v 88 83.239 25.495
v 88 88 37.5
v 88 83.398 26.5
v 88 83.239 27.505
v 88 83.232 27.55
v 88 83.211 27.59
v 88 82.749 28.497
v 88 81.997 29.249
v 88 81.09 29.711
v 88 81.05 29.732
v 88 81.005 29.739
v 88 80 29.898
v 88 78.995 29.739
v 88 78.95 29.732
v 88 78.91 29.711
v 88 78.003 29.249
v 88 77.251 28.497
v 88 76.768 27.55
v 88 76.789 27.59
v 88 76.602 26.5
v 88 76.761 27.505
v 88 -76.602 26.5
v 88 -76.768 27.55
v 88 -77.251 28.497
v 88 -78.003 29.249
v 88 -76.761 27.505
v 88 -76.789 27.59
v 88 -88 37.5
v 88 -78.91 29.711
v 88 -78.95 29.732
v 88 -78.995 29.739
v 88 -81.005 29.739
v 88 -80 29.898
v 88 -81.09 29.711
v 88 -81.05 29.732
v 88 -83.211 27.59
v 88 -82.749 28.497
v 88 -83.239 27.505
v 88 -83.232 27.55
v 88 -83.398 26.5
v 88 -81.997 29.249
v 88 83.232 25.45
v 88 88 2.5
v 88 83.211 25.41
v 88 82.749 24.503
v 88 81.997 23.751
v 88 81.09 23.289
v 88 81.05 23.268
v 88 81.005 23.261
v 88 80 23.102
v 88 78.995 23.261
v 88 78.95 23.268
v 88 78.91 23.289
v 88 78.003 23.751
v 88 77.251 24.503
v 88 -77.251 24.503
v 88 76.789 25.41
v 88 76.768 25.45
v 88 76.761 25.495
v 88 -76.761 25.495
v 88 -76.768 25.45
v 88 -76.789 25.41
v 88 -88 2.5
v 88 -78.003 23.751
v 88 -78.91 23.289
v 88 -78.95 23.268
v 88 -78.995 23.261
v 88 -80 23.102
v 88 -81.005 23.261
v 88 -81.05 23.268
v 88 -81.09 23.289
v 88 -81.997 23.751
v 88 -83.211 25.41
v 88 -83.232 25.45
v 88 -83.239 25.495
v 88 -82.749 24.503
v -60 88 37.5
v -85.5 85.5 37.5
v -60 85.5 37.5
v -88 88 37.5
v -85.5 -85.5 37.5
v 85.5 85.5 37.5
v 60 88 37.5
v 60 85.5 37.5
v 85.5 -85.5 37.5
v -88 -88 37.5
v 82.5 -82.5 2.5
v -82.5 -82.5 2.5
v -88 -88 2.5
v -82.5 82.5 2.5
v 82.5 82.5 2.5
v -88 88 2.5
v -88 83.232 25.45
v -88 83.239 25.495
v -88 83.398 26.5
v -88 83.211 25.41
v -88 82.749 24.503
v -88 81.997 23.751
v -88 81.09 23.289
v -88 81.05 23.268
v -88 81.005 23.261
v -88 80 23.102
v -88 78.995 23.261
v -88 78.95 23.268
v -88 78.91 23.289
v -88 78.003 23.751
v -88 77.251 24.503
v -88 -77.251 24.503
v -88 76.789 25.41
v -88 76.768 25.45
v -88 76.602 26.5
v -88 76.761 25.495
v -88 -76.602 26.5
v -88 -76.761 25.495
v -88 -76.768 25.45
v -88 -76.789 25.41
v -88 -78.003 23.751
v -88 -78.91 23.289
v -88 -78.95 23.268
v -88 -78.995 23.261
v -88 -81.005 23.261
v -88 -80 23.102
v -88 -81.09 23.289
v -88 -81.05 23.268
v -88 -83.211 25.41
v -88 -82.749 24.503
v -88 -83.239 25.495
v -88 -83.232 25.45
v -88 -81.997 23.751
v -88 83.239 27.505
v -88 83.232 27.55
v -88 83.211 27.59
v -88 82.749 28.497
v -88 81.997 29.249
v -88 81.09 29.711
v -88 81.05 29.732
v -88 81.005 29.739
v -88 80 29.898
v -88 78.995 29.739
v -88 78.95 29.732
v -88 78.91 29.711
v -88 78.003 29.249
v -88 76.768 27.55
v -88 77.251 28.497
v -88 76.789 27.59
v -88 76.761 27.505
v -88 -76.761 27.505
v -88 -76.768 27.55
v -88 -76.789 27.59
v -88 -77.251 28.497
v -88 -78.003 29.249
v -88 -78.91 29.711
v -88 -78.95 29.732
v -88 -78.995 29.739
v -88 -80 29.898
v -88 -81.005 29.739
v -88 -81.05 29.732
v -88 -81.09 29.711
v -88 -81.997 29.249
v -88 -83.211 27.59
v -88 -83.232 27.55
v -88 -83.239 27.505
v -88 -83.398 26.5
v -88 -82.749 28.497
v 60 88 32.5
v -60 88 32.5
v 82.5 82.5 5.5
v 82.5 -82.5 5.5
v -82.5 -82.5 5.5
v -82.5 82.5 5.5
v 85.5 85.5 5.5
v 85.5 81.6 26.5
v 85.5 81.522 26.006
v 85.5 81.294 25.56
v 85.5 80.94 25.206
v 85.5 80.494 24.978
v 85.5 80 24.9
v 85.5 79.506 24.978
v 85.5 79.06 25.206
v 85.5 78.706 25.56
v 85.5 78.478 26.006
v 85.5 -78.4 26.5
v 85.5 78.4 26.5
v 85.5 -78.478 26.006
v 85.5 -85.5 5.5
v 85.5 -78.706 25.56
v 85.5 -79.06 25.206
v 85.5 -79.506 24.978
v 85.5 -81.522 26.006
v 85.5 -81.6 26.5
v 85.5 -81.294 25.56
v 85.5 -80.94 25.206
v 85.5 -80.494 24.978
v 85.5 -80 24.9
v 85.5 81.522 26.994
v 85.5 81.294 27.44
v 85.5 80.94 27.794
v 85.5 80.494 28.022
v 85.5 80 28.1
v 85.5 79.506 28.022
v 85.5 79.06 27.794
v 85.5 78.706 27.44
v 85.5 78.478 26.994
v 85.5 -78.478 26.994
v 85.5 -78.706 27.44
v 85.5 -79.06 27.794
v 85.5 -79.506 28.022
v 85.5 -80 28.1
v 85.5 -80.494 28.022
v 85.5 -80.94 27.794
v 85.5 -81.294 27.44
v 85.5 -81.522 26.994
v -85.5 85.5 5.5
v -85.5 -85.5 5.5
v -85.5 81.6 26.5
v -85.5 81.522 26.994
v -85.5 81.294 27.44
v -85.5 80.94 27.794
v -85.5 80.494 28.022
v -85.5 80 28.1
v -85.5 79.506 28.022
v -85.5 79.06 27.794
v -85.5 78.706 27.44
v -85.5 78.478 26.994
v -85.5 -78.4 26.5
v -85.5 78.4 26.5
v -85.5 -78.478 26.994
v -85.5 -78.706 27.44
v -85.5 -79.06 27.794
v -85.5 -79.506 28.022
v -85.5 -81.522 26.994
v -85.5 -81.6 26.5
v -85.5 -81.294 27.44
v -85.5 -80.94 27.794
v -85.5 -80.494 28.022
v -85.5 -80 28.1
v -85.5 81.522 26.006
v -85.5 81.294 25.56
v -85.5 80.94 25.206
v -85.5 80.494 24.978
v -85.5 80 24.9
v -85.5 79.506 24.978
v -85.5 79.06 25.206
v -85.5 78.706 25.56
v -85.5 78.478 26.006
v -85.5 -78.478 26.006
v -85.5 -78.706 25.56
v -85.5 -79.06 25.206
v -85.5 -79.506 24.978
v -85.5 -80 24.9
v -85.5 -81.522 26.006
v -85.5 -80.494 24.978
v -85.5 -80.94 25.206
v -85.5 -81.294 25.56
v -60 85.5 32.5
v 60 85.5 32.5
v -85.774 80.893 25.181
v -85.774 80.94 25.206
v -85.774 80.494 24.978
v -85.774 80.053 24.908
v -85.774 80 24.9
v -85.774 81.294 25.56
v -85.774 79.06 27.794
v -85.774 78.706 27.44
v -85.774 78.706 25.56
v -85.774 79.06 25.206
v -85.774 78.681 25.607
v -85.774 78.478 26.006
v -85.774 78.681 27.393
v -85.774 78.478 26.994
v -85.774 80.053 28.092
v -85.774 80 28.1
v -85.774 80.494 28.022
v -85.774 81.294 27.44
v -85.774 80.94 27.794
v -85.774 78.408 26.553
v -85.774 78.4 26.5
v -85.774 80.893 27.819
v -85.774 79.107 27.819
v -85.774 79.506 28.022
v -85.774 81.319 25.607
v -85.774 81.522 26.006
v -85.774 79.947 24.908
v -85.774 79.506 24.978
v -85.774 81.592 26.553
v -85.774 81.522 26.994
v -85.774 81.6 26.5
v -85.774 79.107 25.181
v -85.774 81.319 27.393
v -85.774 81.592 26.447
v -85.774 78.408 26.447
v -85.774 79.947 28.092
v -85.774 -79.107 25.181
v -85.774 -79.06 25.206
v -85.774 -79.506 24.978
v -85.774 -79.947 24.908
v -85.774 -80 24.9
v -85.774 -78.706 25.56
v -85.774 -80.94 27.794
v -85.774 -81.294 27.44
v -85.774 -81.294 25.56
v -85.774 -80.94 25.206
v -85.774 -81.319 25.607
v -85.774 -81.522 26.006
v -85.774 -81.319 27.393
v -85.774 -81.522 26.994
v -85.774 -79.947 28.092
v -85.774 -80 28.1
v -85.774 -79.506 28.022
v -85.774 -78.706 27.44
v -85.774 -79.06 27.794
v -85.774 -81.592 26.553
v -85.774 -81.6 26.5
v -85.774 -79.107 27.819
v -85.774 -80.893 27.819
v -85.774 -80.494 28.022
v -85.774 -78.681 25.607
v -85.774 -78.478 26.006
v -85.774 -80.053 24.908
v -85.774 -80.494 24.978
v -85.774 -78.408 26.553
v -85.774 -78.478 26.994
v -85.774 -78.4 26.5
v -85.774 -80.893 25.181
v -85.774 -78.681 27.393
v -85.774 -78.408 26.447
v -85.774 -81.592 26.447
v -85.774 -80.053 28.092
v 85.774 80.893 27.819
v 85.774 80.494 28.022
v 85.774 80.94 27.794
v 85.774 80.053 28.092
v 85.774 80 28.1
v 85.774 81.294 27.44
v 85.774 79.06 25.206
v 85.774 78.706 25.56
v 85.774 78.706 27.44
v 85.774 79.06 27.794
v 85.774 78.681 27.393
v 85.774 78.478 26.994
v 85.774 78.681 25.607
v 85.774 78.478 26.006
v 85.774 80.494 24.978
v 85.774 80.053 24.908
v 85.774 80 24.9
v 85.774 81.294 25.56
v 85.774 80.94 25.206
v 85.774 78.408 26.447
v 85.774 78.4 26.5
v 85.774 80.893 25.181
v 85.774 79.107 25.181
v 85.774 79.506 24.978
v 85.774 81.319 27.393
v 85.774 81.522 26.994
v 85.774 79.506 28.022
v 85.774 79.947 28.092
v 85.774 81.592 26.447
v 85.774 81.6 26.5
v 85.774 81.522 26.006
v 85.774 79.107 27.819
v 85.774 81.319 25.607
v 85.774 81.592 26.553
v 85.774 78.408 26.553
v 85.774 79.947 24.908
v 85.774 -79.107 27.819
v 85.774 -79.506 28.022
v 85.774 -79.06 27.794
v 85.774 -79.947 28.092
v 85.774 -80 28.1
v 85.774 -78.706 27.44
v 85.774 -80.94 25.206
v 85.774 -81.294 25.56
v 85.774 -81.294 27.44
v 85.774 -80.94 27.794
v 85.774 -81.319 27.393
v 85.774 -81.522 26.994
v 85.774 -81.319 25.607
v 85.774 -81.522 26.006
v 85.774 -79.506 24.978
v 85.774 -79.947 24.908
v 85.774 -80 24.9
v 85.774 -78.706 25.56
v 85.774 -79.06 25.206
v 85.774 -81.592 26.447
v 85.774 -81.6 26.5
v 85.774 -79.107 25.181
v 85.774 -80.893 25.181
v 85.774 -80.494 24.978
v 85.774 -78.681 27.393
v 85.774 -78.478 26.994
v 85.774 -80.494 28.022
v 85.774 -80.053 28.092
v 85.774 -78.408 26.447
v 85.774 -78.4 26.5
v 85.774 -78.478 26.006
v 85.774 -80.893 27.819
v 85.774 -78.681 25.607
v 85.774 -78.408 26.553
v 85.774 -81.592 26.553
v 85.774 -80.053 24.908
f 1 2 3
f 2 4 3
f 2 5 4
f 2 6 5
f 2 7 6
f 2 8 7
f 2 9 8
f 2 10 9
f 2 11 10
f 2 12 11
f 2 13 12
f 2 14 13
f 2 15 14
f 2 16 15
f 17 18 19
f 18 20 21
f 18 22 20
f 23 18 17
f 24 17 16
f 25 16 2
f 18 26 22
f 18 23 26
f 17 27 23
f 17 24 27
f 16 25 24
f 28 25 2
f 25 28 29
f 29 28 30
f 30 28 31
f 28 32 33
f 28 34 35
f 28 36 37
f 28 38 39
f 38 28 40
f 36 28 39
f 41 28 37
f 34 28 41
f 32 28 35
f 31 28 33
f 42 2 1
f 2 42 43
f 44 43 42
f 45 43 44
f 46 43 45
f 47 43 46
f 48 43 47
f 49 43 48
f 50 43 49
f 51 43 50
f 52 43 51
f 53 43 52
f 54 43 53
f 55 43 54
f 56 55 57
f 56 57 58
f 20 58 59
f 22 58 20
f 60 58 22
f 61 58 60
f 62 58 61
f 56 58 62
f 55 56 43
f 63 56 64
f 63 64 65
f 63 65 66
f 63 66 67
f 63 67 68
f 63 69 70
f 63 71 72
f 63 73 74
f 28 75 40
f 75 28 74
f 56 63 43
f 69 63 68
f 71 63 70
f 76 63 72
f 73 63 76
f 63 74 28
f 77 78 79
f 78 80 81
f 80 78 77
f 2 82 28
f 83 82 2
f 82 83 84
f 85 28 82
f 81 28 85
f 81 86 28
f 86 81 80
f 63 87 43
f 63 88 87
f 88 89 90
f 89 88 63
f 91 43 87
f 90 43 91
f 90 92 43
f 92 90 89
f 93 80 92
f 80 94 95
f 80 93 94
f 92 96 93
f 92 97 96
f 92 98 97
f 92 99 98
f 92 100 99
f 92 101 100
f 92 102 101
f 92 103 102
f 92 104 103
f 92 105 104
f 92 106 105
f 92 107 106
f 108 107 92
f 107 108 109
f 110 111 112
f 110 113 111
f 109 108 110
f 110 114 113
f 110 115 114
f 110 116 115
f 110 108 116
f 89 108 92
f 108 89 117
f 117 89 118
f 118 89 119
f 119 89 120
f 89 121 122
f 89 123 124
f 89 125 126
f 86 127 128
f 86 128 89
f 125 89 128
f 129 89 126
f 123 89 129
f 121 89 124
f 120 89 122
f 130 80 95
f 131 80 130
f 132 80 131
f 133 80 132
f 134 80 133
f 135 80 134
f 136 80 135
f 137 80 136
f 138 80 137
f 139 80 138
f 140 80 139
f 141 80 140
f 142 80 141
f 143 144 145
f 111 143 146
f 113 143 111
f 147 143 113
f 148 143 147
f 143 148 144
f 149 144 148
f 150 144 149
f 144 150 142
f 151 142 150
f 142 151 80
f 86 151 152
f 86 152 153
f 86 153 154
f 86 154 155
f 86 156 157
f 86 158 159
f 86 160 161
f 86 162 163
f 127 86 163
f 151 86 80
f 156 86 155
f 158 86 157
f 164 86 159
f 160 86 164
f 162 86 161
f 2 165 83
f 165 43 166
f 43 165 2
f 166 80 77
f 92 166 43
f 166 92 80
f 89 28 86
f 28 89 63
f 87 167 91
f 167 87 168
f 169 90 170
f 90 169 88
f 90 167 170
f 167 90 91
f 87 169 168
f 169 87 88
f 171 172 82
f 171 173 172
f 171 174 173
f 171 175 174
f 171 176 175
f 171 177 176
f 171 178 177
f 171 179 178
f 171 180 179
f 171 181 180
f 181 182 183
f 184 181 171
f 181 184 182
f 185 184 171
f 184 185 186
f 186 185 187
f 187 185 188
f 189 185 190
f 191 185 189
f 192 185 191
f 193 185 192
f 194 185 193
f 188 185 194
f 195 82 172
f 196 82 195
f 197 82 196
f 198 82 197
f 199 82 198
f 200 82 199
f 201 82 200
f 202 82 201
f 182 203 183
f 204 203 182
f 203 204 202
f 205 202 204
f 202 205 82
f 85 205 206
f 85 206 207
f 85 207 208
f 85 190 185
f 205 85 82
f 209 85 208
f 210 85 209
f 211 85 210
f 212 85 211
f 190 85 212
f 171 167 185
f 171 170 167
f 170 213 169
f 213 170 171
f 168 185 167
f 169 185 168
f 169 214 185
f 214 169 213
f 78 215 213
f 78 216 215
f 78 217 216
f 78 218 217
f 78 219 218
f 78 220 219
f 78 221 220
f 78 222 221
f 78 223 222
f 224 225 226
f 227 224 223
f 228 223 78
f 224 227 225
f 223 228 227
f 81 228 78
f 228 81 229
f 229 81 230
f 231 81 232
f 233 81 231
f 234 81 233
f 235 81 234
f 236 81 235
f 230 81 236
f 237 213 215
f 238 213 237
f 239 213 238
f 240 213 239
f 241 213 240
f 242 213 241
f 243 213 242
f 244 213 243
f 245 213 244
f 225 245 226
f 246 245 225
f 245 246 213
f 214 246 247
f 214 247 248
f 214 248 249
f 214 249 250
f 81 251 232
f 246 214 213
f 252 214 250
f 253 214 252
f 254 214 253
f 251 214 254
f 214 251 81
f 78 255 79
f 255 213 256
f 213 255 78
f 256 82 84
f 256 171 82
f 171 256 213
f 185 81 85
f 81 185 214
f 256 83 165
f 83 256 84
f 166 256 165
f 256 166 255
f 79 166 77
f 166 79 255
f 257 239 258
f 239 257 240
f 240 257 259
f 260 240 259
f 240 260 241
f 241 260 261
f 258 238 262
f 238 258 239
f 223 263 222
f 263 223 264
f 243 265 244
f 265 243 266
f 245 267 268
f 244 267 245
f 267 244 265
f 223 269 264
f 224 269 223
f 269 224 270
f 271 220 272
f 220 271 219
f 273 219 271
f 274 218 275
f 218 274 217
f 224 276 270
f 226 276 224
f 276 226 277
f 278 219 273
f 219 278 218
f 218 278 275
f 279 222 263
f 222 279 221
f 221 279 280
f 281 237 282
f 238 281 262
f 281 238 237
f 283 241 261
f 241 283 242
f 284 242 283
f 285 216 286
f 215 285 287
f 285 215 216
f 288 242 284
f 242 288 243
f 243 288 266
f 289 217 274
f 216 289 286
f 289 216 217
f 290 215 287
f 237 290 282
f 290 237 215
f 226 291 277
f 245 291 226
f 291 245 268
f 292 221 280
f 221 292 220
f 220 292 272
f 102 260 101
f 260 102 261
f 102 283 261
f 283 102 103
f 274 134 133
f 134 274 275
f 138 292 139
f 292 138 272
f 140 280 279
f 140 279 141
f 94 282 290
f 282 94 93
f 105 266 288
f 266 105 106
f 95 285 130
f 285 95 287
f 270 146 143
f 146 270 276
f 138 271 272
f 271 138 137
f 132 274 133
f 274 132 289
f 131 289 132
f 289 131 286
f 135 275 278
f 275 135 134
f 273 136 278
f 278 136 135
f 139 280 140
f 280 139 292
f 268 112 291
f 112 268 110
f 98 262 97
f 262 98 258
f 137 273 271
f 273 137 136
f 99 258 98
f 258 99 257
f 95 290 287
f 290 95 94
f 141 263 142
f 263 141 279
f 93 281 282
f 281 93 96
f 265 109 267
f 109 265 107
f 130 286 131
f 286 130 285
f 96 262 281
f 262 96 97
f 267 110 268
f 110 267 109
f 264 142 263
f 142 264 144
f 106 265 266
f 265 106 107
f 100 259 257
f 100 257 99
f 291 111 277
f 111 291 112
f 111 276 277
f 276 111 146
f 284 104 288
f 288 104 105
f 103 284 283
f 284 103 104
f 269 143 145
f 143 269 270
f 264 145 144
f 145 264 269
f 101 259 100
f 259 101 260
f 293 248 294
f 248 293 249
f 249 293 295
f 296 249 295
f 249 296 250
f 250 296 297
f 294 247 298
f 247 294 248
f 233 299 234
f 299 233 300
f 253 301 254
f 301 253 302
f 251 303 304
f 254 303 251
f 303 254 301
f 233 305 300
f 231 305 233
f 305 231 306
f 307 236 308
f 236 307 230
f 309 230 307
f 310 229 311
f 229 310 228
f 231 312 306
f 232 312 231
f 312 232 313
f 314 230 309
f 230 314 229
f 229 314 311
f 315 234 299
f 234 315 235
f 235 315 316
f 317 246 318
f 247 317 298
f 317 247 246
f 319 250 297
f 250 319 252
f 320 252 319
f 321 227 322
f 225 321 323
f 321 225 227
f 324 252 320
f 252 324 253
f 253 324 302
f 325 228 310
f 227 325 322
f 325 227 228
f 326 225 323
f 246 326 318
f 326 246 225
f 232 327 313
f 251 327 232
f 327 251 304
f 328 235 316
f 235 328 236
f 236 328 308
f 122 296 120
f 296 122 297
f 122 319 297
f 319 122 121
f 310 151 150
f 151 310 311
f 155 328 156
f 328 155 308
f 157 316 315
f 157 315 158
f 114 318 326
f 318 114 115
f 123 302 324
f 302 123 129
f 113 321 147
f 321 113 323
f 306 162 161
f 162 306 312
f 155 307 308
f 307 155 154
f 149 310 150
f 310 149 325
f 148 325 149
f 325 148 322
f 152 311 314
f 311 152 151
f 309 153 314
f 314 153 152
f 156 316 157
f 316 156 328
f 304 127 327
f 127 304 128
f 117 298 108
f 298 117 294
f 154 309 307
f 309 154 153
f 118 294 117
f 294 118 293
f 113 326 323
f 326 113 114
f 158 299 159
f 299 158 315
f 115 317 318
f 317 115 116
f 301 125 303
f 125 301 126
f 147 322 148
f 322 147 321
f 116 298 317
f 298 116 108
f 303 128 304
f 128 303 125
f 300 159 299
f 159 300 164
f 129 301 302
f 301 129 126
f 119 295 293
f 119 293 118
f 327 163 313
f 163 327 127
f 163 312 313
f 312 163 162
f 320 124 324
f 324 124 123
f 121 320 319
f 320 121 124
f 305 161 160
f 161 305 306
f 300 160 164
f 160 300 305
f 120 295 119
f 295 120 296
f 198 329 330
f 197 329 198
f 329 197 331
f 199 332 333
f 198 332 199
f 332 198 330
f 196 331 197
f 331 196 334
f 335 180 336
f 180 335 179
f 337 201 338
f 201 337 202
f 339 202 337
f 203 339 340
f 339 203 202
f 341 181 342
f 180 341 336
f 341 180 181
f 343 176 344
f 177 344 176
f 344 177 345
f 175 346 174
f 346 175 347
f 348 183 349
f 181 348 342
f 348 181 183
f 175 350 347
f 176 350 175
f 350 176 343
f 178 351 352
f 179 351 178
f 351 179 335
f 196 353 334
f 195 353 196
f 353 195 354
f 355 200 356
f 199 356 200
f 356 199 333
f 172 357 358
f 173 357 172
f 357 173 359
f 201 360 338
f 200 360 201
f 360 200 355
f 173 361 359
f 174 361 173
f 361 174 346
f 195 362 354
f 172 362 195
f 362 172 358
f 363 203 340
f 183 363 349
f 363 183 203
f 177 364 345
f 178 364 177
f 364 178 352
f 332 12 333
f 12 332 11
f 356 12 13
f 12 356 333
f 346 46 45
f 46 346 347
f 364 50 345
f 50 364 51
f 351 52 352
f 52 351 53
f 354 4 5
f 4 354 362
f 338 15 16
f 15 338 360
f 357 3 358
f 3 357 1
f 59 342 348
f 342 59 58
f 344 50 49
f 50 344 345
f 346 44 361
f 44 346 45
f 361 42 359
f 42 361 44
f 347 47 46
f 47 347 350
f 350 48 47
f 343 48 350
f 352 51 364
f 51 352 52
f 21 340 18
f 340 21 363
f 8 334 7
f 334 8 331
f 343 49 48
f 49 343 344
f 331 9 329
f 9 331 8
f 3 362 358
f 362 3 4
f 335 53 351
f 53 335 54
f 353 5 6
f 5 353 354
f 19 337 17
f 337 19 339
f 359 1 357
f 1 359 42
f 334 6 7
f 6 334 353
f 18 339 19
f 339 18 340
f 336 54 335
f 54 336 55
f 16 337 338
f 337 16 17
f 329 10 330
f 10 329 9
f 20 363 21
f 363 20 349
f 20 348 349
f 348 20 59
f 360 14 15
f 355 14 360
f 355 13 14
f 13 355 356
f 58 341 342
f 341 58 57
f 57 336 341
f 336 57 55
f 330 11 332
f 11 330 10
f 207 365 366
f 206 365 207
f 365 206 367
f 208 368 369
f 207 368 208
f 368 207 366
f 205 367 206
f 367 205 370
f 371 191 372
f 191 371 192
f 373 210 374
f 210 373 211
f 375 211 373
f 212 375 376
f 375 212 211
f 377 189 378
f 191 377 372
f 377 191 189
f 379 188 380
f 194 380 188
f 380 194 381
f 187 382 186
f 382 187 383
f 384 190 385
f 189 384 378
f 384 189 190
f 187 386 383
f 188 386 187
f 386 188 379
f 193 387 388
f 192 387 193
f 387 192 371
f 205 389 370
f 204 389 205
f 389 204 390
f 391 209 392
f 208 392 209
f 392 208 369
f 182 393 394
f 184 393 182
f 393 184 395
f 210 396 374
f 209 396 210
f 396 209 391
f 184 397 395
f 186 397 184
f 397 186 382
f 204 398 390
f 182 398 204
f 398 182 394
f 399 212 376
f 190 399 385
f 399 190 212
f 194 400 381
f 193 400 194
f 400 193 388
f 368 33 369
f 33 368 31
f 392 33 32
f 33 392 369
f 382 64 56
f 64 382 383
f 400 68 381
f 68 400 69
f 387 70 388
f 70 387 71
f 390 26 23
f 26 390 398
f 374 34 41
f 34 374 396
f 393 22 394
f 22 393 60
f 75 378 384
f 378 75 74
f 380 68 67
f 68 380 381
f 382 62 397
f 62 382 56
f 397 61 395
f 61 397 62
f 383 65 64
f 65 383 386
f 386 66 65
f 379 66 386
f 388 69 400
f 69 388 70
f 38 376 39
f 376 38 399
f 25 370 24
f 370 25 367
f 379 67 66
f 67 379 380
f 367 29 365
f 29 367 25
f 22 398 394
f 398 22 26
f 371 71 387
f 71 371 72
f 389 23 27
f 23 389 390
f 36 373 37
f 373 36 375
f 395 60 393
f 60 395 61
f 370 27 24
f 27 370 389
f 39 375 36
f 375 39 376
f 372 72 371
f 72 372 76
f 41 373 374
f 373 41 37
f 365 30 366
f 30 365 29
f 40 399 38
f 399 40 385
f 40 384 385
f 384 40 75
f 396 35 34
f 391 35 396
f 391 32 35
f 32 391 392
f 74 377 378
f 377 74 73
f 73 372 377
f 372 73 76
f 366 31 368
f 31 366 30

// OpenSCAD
difference() {
    translate([0,0,40/2])
        difference() {
            cube([176,176,40-5], center=true);
            cube([165,165,70], center=true);
            translate([0,0,3+2.5]) cube([171,171,40], center=true);
            //translate([2.5,2.5,2.5]) cube([170,170,70]);
            translate([0,50,0+25+5]) cube([120,180,35], center=true);
        }

    translate([-170/2,170/2-5,24+2.5])
        rotate([0,90,0]) screw_hole();
    translate([-170/2,-170/2+5,24+2.5])
        rotate([0,90,0]) screw_hole();
    translate([170/2,170/2-5,24+2.5])
        rotate([0,-90,0]) screw_hole();
    translate([170/2,-170/2+5,24+2.5])
        rotate([0,-90,0]) screw_hole();
}



module screw_hole() {
    translate([0,0,-3])
    union() {
        translate([0,0,5]) cylinder(10, 1.5+0.1, 1.5+0.1, center=true, $fn=20);
        translate([0,0,2.5/2-0.2]) cylinder(2.5+0.1,3.5+0.1,1.5, center=true, $fn=20);
    }
}
